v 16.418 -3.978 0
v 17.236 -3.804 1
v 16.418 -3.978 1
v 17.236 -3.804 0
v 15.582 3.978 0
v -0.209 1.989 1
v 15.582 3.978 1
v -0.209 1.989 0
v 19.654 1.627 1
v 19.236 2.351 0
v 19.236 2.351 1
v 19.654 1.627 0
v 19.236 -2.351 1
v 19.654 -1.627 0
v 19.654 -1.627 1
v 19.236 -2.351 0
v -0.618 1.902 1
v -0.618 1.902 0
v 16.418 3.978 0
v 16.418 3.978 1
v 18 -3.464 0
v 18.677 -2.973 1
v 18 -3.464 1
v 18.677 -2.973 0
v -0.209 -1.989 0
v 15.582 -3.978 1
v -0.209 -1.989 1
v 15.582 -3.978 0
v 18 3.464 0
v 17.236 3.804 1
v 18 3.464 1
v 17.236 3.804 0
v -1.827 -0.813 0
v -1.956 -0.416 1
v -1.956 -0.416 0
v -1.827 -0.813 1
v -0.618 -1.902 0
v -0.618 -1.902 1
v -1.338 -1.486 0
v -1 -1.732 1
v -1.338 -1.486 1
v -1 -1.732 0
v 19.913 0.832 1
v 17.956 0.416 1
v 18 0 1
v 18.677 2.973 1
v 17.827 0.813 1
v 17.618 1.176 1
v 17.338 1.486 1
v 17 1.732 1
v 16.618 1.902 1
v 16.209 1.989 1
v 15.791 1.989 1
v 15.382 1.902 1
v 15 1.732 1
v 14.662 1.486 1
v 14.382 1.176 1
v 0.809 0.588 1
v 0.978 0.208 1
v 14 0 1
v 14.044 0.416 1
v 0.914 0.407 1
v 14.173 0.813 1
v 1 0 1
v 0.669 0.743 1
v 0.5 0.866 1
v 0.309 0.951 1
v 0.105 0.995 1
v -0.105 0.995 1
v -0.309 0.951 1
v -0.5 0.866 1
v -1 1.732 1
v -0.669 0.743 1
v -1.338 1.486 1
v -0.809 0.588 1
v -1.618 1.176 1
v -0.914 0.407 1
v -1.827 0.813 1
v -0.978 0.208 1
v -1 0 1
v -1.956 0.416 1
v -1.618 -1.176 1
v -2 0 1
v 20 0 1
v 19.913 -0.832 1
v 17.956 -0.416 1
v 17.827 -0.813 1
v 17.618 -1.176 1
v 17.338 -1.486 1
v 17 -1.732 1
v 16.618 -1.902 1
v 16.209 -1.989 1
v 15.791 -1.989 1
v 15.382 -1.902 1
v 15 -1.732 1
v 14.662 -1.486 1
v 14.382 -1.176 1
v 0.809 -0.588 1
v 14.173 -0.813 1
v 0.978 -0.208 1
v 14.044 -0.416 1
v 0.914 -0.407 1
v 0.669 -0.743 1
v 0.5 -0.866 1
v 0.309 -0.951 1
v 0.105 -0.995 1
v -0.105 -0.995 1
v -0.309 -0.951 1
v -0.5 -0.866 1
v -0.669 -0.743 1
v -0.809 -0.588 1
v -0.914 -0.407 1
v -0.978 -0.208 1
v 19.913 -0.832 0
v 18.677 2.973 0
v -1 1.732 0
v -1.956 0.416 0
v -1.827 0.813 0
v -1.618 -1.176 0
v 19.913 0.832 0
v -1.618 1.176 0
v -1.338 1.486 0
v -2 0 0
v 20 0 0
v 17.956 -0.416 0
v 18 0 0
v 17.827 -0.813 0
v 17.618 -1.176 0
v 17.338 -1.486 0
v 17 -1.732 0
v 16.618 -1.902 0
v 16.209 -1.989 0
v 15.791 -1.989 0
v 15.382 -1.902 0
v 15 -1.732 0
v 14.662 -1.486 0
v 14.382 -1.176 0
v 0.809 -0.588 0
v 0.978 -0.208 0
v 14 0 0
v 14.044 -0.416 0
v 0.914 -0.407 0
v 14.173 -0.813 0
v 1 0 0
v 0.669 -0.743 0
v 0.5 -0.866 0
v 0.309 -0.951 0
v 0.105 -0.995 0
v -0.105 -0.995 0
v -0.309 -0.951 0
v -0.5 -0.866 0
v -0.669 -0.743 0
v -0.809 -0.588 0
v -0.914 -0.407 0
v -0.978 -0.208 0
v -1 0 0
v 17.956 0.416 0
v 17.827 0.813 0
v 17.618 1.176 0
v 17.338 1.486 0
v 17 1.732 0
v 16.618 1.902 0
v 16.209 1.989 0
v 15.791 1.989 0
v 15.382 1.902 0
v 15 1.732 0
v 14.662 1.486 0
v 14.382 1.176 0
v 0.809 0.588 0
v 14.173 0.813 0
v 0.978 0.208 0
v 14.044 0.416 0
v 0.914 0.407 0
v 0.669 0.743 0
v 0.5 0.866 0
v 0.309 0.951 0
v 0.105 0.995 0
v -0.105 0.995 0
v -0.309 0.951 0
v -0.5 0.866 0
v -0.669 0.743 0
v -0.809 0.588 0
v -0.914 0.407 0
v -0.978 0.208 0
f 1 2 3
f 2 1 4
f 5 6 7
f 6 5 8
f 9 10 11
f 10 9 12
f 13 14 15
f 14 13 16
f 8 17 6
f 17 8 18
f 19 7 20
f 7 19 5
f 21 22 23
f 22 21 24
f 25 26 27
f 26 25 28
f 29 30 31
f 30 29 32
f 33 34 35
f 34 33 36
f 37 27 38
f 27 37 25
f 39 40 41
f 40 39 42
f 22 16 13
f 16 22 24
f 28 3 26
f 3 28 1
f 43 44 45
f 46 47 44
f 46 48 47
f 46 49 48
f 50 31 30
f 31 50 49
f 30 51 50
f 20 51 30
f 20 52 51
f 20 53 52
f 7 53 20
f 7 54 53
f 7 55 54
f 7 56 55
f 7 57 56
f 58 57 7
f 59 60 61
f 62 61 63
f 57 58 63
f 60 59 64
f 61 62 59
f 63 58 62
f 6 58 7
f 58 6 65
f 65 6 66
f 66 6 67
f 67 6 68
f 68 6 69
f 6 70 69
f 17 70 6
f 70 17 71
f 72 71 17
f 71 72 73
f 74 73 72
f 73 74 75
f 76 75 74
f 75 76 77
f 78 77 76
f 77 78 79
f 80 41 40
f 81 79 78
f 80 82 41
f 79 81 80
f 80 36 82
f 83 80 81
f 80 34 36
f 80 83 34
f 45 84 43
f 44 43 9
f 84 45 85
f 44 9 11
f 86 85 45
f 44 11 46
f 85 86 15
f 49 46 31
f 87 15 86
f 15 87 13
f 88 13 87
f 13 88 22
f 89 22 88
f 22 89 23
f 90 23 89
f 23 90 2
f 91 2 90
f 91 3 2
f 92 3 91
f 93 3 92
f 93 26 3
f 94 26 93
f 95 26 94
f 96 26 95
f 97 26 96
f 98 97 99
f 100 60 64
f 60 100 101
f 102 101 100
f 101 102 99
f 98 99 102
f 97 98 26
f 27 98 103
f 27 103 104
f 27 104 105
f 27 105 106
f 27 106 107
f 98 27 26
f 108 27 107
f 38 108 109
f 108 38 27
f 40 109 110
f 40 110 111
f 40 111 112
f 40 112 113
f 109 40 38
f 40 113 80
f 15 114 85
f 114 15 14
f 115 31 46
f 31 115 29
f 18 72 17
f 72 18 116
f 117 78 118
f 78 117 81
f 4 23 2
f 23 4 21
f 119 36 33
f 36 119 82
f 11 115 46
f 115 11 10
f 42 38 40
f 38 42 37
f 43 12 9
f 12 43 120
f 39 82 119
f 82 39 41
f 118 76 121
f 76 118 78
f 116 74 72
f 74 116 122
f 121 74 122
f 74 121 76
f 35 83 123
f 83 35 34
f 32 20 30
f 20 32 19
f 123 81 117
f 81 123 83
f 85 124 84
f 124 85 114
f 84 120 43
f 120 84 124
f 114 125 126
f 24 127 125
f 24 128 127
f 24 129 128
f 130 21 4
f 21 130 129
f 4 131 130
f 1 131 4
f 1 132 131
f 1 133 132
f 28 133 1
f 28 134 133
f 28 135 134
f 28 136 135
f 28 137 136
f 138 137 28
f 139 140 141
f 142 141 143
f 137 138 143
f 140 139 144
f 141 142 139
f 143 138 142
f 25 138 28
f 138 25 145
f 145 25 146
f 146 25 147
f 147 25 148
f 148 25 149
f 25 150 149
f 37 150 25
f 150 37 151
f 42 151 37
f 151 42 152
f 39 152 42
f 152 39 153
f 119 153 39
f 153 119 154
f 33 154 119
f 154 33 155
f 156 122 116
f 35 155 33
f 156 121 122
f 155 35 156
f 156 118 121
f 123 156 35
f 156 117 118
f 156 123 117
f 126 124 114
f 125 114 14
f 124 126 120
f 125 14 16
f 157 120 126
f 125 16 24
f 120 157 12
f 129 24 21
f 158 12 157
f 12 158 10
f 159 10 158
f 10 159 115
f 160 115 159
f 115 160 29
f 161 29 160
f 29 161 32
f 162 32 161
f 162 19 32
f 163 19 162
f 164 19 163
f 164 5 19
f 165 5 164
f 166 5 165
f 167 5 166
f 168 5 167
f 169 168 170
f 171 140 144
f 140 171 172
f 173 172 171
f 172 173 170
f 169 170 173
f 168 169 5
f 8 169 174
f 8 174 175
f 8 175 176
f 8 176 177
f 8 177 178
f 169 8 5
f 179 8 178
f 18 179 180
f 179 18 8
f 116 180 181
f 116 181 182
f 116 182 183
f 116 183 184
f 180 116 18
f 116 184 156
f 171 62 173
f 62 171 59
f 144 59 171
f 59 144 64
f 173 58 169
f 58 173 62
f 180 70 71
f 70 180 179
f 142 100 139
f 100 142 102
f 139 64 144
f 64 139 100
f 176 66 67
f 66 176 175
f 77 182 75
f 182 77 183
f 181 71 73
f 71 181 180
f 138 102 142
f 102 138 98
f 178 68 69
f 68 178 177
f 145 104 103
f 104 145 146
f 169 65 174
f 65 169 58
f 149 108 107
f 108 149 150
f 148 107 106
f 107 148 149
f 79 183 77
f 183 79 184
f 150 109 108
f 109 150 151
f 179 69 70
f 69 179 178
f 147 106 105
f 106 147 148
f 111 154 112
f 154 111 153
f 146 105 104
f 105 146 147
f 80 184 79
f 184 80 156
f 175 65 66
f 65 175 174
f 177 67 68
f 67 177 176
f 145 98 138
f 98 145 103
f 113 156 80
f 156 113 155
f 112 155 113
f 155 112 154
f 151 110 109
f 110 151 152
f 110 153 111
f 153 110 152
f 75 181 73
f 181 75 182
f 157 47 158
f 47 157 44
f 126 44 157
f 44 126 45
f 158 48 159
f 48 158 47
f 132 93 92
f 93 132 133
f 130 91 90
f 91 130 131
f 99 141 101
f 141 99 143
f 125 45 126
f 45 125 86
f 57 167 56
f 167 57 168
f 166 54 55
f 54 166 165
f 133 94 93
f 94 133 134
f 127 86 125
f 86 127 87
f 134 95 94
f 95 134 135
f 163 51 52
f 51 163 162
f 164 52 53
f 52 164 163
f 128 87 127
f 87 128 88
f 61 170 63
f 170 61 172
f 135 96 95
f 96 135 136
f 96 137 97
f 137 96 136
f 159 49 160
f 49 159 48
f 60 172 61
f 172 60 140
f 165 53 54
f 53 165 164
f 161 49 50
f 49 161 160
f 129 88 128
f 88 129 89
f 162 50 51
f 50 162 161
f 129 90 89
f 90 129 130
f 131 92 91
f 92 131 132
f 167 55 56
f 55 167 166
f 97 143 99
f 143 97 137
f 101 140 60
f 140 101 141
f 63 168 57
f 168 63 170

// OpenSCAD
difference(){
hull(){

cylinder(1,2,2,$fn=30);


translate([16,0,0])
cylinder(1,4,4, $fn=30);


}


cylinder(3,1,1,$fn=30, center= true);


translate([16,0,0])
cylinder(3,2,2,$fn=30, center= true);
}
